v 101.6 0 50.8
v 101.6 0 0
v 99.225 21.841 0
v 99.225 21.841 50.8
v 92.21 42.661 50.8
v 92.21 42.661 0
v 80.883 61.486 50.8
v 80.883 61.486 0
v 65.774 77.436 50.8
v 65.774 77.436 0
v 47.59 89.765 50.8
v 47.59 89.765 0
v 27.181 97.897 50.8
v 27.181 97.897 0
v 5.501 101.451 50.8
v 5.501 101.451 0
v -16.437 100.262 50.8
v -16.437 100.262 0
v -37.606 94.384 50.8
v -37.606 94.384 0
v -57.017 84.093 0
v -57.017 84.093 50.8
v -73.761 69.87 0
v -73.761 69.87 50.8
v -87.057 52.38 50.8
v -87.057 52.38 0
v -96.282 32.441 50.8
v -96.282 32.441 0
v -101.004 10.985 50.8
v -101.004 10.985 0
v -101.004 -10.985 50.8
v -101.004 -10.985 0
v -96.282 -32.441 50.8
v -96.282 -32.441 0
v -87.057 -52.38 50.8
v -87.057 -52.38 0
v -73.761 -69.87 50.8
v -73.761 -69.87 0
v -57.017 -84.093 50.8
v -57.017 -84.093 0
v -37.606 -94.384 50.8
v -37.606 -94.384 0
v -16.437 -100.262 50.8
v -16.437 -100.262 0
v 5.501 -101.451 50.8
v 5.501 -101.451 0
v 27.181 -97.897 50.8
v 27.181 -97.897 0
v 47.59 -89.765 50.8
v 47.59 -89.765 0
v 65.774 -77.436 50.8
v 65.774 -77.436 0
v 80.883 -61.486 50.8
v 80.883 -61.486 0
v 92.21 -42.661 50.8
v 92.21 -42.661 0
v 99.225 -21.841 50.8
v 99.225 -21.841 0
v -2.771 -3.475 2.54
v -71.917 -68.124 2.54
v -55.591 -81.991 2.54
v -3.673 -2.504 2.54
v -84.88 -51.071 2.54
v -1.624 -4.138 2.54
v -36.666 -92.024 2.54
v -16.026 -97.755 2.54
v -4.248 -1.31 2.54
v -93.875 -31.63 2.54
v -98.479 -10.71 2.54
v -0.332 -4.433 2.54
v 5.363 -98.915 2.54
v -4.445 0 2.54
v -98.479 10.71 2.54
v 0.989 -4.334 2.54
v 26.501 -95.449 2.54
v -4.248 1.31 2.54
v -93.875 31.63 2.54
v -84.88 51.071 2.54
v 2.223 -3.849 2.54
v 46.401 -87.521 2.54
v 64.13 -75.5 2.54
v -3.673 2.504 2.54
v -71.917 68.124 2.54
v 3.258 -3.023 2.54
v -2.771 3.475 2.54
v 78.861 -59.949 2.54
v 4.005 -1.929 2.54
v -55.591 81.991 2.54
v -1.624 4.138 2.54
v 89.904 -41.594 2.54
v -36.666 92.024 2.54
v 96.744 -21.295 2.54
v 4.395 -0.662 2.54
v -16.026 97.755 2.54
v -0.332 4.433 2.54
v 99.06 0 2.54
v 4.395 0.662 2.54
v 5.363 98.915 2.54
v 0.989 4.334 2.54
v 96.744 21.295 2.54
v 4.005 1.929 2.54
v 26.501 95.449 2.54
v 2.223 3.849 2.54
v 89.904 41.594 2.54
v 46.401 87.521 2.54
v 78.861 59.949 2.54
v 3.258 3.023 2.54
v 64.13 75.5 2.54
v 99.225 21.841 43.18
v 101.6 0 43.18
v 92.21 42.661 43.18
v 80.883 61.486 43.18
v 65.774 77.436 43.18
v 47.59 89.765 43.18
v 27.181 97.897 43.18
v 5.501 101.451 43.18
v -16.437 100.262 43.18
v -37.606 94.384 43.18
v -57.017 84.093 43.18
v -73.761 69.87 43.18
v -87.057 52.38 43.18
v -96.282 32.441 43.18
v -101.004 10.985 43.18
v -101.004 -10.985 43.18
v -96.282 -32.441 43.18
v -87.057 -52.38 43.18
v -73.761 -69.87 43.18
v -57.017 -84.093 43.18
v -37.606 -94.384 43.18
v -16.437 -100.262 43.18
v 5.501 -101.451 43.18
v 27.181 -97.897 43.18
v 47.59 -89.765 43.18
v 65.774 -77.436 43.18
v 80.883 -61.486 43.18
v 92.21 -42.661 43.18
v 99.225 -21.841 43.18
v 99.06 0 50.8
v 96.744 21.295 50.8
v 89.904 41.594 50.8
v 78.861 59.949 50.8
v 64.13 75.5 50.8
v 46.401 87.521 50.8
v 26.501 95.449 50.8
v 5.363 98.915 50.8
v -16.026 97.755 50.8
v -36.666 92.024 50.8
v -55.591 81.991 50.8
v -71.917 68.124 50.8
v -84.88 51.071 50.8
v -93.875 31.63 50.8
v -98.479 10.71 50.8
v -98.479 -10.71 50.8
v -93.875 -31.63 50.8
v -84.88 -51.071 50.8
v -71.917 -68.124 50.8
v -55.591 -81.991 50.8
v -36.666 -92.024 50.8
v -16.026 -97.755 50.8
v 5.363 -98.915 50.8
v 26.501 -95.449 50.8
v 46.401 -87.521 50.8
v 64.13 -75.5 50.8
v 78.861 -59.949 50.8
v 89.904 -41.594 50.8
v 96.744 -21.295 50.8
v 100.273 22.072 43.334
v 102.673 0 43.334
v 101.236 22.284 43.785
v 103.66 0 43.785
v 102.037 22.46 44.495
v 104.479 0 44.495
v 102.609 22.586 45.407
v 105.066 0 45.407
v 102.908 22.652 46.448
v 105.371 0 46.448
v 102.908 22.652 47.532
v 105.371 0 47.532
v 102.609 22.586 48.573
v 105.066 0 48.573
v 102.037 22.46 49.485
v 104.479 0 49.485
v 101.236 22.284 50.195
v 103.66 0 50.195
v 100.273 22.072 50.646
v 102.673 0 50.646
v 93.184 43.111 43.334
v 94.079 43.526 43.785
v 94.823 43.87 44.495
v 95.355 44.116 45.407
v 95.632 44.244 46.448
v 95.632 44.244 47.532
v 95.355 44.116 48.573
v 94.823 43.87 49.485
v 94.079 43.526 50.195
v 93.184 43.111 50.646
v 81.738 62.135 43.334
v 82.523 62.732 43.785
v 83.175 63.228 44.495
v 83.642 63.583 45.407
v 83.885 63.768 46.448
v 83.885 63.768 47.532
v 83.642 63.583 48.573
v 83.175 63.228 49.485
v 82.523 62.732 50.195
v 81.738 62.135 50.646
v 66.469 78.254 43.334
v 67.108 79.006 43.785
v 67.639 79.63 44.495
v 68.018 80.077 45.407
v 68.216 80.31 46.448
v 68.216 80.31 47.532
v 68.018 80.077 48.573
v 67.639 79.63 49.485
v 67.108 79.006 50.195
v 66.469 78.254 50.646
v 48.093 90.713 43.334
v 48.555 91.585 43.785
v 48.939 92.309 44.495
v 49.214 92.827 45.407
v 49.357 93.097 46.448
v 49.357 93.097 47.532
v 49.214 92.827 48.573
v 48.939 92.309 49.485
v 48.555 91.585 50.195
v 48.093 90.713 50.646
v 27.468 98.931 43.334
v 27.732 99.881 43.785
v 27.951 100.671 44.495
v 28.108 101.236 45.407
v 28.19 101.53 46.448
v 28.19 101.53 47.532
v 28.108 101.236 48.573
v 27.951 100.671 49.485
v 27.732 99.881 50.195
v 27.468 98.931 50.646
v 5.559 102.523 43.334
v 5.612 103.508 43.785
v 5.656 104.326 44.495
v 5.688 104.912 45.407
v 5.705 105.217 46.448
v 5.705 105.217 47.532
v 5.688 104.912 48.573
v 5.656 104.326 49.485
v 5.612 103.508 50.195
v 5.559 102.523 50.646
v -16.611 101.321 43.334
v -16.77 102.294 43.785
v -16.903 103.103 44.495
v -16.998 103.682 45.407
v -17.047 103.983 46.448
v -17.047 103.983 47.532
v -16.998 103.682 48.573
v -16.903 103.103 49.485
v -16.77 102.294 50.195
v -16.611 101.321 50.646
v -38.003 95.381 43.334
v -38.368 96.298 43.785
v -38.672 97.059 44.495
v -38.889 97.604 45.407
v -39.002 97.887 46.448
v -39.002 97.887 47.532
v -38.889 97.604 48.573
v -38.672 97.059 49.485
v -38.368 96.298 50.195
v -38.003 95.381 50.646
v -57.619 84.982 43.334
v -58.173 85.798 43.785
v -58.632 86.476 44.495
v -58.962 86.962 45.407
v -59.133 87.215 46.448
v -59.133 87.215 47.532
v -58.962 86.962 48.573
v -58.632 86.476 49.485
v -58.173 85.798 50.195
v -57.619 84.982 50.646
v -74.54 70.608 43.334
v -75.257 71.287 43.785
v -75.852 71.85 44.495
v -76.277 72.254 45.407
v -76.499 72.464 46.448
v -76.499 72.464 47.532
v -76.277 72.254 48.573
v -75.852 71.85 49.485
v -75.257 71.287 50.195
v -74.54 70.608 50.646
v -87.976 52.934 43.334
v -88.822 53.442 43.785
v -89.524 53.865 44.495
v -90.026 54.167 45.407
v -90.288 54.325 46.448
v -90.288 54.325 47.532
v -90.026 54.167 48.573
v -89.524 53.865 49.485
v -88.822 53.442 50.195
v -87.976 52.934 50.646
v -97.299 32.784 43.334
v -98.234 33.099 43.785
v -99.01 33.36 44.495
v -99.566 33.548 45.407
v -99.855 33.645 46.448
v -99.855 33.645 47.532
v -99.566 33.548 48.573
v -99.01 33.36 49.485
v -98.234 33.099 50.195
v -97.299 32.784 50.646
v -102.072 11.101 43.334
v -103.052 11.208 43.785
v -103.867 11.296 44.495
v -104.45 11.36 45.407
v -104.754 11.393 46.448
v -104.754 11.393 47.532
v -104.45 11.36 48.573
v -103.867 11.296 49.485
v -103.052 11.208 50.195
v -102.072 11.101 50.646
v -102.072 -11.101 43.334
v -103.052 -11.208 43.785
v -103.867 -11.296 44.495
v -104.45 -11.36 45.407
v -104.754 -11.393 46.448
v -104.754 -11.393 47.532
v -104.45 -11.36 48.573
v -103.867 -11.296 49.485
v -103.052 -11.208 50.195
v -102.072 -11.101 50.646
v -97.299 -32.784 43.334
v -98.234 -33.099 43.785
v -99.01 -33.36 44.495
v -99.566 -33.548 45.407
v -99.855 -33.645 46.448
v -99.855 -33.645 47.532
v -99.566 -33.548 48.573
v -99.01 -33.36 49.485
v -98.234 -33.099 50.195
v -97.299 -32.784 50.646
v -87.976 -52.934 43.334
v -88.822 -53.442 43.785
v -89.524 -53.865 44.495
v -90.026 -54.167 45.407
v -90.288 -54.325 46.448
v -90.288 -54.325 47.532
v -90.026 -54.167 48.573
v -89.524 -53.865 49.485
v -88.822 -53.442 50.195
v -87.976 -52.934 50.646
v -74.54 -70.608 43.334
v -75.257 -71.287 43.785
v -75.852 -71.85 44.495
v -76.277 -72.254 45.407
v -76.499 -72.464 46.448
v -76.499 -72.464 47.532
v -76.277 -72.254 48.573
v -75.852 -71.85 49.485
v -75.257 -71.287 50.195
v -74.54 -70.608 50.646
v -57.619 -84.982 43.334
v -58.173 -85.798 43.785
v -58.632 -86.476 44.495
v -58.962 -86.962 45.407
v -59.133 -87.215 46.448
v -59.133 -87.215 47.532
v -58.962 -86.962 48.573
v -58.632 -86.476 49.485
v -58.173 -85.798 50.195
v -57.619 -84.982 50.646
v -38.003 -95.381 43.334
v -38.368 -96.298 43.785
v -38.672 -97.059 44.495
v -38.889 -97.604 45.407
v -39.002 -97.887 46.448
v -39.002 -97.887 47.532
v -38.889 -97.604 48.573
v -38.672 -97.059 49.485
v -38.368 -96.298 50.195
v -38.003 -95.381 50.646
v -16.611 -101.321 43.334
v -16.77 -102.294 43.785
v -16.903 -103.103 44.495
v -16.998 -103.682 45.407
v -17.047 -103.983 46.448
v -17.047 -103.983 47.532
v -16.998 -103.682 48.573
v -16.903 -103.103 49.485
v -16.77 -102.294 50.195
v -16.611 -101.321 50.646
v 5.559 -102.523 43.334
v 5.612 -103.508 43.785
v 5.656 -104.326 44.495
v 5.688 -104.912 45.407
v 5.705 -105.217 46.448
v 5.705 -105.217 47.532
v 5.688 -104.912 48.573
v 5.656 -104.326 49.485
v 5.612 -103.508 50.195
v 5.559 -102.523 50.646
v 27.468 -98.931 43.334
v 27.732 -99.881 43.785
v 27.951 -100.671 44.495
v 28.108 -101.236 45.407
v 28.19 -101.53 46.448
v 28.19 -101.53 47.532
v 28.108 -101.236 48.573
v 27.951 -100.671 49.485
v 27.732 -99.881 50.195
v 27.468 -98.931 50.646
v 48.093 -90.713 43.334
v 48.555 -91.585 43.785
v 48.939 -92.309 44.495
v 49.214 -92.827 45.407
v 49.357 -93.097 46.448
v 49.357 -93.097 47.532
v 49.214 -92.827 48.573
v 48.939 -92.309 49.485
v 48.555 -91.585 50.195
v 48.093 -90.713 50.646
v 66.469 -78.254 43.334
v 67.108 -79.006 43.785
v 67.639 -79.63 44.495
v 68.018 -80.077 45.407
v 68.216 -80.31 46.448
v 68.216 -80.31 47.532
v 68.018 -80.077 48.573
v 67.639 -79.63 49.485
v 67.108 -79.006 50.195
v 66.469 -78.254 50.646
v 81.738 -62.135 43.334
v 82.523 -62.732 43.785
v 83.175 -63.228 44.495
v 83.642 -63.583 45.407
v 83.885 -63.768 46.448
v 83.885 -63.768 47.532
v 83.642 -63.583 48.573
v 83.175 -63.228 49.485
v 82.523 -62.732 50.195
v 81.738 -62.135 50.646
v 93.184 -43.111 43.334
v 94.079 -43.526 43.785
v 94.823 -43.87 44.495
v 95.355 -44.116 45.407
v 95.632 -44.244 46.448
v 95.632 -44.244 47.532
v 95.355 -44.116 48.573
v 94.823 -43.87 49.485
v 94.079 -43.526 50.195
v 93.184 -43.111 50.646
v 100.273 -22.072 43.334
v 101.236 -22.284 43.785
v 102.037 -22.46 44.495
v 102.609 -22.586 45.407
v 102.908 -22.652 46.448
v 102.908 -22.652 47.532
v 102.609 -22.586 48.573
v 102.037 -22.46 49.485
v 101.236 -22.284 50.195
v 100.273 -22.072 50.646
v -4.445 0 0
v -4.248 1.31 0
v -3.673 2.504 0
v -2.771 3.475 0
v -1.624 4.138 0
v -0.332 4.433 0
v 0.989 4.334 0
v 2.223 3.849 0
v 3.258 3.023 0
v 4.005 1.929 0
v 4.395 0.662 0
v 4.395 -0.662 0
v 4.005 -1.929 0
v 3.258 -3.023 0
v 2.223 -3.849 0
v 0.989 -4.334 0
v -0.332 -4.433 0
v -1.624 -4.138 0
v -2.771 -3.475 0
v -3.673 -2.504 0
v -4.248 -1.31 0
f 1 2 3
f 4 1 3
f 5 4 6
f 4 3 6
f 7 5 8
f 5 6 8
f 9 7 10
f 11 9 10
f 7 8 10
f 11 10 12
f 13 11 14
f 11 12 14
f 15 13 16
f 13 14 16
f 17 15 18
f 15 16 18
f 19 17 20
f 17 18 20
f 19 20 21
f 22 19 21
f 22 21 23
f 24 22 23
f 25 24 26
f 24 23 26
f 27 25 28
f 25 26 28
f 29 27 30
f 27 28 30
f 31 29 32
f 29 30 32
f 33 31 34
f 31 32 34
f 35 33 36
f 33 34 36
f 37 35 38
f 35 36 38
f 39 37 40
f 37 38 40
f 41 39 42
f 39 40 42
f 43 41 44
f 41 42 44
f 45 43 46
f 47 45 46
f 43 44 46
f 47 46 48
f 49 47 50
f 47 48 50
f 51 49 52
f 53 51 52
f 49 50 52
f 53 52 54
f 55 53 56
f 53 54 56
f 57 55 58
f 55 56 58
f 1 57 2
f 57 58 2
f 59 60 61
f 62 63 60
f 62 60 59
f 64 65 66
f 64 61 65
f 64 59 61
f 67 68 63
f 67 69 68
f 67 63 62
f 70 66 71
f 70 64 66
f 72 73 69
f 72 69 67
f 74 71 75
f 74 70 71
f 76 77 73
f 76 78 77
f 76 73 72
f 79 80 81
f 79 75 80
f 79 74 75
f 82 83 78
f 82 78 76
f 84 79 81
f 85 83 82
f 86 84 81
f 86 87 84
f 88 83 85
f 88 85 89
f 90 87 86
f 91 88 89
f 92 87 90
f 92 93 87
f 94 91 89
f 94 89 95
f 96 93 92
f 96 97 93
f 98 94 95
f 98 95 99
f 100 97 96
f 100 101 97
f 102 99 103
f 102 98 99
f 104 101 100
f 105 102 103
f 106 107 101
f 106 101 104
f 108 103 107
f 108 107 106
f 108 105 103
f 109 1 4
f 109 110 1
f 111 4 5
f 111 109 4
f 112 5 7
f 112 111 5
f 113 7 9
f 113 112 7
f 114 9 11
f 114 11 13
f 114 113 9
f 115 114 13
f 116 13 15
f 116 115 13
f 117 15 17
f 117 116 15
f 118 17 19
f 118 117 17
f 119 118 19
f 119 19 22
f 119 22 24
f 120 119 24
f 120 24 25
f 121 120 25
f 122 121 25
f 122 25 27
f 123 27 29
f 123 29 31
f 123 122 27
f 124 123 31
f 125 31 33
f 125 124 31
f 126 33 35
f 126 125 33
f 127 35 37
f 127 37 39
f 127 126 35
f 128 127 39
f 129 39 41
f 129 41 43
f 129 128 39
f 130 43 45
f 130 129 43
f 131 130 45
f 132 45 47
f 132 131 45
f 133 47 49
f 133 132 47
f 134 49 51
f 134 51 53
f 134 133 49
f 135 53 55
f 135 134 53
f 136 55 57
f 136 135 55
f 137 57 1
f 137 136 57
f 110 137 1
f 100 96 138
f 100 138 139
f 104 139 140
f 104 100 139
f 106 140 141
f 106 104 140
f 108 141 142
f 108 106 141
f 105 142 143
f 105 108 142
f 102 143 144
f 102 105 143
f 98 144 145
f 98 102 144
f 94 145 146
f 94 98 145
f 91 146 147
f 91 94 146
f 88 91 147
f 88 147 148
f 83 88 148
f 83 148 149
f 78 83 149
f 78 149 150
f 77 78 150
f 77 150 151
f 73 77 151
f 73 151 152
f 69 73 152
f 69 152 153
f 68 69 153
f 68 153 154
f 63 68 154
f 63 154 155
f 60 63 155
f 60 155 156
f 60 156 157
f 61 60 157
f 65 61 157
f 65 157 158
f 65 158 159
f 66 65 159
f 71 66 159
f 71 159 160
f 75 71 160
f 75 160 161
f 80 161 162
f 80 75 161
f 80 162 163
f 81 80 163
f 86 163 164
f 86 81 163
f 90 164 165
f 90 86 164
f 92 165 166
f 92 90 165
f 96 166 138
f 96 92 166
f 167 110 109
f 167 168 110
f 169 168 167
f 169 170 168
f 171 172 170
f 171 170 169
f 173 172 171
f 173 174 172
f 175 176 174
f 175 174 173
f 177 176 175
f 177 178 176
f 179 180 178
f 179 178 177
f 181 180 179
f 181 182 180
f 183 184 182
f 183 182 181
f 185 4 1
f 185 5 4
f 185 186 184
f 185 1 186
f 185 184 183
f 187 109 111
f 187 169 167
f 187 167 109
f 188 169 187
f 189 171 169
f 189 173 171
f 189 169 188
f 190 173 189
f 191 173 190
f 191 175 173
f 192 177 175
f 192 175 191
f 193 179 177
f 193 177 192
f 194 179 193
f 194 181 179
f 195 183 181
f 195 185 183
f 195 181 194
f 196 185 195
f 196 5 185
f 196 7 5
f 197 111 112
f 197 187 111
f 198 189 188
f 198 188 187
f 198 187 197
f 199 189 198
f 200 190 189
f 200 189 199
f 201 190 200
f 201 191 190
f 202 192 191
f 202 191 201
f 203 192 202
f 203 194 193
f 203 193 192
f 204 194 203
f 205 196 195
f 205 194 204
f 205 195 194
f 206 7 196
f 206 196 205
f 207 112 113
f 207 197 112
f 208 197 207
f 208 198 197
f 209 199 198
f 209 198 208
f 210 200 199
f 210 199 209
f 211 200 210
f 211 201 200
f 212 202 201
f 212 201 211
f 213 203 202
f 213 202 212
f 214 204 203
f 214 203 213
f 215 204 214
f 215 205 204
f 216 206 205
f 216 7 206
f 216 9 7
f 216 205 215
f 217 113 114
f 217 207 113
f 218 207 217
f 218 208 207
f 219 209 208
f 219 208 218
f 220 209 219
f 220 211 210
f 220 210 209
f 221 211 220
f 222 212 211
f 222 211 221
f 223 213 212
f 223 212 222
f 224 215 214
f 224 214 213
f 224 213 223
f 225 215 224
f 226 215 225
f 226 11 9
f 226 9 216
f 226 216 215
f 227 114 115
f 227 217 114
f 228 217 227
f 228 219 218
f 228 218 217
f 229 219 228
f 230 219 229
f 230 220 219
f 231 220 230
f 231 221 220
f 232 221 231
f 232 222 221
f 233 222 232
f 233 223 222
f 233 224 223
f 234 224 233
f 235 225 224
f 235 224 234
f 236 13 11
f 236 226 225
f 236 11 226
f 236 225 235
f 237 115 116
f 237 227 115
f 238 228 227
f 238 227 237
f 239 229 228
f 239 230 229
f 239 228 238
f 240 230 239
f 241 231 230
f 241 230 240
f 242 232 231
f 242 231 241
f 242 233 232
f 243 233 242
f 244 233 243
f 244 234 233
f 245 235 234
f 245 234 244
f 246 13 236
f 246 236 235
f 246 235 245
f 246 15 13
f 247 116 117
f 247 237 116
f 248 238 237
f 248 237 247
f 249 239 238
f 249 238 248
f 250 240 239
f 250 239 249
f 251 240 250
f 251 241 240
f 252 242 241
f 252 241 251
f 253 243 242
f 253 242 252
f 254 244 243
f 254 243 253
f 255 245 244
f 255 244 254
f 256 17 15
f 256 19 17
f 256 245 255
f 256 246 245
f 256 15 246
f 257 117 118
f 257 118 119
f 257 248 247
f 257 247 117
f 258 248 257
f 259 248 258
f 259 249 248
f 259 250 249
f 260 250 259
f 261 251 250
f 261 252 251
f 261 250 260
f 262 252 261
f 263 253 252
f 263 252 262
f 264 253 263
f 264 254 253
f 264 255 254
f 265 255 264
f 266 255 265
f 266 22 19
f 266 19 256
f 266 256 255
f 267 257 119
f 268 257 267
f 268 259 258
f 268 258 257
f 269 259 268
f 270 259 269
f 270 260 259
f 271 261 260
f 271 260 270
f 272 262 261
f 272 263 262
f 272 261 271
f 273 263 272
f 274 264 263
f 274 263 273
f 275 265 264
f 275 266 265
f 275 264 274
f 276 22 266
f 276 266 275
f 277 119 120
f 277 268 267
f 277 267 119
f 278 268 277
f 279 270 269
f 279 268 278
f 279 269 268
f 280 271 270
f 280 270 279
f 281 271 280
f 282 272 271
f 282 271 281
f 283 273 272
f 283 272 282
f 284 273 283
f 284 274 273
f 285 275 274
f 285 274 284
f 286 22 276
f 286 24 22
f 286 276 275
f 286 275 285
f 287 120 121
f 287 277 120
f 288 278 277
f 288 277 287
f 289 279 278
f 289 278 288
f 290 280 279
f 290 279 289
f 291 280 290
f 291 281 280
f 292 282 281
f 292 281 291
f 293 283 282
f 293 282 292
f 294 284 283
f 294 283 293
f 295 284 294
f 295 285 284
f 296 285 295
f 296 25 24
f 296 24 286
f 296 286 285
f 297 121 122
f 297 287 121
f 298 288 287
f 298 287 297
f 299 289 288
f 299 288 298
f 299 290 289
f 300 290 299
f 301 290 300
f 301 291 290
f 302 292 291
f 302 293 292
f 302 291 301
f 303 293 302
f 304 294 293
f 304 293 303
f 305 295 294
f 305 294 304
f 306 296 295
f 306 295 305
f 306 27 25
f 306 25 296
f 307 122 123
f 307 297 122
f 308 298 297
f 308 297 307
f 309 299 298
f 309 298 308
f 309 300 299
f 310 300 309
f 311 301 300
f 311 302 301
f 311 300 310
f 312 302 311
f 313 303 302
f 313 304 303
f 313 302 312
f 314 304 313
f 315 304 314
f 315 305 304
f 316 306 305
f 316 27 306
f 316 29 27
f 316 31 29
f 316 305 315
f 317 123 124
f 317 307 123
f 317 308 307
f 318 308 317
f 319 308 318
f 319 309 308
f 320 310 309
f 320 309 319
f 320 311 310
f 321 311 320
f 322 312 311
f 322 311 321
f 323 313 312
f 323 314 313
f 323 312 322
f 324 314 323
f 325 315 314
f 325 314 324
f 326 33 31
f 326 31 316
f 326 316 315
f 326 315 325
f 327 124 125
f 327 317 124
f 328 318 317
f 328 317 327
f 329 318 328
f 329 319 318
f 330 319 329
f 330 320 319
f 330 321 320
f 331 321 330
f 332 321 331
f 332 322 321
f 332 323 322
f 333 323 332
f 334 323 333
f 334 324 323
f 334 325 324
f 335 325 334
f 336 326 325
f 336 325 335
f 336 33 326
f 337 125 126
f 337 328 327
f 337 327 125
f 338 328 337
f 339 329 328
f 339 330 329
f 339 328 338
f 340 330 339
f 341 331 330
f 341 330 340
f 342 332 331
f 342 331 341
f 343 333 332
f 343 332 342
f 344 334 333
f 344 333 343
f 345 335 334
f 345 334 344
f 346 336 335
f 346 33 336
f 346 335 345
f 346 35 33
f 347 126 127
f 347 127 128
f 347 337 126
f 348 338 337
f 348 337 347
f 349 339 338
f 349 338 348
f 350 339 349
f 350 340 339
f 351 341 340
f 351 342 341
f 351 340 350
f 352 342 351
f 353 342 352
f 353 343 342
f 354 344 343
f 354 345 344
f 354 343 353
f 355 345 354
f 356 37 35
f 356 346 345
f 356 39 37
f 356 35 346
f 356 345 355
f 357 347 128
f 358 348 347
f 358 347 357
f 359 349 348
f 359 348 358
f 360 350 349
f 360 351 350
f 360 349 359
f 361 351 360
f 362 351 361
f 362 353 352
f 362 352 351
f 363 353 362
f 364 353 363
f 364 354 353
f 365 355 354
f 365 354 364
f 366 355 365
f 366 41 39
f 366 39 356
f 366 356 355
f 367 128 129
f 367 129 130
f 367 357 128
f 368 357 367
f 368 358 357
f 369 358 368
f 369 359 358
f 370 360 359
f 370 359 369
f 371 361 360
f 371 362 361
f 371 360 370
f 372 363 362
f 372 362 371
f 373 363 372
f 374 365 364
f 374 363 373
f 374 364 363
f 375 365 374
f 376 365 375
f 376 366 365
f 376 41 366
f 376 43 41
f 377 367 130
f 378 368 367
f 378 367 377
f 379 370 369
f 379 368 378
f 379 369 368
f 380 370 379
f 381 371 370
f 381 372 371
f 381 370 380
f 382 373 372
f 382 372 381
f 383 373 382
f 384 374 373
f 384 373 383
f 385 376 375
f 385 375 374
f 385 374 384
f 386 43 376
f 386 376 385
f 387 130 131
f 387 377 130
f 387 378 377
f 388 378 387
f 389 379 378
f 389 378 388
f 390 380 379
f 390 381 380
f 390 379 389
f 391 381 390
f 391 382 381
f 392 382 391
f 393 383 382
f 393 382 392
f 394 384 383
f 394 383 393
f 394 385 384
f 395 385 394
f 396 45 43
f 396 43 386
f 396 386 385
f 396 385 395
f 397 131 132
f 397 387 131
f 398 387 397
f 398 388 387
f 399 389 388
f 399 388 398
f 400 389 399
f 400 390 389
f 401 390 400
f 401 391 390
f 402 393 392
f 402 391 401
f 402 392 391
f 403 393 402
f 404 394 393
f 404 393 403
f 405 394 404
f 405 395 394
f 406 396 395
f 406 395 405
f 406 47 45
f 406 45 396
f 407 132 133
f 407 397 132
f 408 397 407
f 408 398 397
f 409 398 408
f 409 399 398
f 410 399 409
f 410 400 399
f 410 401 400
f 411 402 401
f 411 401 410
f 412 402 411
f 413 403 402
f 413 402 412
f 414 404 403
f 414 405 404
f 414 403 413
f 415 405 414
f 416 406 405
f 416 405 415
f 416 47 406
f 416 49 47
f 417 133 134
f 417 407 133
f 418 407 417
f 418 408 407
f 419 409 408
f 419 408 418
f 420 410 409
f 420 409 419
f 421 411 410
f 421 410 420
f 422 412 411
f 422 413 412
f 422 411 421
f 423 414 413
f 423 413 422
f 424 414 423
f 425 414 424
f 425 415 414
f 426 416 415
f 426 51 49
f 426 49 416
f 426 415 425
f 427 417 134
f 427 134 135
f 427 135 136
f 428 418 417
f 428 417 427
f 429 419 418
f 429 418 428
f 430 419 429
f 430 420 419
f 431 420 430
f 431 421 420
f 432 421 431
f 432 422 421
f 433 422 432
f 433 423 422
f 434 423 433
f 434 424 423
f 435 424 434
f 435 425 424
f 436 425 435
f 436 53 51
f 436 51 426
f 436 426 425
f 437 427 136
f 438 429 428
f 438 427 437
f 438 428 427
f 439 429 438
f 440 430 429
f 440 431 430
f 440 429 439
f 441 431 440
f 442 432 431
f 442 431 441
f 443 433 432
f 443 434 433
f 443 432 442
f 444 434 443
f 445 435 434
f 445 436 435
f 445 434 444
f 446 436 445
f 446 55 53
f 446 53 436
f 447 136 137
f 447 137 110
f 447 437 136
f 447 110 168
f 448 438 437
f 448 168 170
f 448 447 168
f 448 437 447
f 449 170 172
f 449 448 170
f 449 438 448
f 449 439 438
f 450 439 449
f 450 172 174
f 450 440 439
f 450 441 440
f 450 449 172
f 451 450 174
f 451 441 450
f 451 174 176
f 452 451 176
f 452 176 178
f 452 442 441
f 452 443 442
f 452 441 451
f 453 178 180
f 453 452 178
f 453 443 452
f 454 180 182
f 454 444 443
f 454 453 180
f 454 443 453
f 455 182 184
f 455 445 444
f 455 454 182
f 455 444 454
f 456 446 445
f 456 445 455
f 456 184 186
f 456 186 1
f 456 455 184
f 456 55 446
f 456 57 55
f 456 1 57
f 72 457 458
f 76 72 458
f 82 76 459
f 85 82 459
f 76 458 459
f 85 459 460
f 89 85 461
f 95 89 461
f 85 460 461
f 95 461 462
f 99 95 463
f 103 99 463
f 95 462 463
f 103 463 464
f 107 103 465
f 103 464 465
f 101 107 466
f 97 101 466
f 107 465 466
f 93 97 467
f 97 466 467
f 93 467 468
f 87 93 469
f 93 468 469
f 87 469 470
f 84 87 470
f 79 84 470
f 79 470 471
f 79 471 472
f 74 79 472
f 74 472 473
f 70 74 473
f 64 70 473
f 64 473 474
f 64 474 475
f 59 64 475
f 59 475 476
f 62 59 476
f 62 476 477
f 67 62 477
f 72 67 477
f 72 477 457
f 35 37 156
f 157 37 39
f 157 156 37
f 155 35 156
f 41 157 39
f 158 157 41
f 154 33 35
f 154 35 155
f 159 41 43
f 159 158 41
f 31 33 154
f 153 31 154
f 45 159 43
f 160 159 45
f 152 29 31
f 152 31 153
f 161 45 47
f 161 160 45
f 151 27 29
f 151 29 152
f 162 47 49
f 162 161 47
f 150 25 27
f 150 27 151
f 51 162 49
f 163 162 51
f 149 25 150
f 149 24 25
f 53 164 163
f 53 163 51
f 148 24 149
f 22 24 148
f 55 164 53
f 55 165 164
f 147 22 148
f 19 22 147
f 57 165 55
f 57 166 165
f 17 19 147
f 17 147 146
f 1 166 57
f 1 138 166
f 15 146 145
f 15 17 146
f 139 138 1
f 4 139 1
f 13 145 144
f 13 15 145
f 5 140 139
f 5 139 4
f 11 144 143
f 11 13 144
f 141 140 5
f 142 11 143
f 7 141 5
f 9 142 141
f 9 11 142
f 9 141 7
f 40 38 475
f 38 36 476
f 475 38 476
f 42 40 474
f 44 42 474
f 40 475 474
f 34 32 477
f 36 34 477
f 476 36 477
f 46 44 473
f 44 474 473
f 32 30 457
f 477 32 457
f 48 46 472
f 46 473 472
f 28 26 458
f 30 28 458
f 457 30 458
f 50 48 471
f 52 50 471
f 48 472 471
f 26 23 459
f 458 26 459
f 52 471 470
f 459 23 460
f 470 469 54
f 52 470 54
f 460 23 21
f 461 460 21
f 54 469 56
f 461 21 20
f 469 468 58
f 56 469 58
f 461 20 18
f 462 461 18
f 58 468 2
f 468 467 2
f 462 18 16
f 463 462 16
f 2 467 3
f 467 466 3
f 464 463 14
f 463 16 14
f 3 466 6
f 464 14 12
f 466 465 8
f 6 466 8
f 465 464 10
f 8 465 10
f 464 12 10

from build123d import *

# Parameters (mm, degrees)
F0_R     = 101.6
F1_DEPTH = 50.8
F2_T     = -2.54
F6_D     = 8.89


with BuildPart() as f1:
    # F0 (on Top) → F1 (new body)
    with BuildSketch(Plane.XY):
        Circle(F0_R)
    extrude(amount=F1_DEPTH)

    # F2
    f2_openings = [f1.faces().sort_by_distance(p)[0] for p in [
        (0, 0, 50.8),
    ]]
    offset(amount=F2_T, openings=f2_openings)

    # F6 (through all)
    with Locations(Plane.XY.offset(2.54)):
        with Locations((0, 0)):
            Hole(F6_D / 2)


with BuildPart() as f4:
    # F3 (on Front) → F4 (revolve)
    with BuildSketch(Plane.XZ):
        with BuildLine():
            Line((101.6, 50.8), (101.6, 43.18))
            ThreePointArc((101.6, 43.18), (105.41, 46.99), (101.6, 50.8))
        make_face()
    revolve(axis=Axis((0, 0, 25.4), (0, 0, 1)))


solid = Compound([f1.part, f4.part])
